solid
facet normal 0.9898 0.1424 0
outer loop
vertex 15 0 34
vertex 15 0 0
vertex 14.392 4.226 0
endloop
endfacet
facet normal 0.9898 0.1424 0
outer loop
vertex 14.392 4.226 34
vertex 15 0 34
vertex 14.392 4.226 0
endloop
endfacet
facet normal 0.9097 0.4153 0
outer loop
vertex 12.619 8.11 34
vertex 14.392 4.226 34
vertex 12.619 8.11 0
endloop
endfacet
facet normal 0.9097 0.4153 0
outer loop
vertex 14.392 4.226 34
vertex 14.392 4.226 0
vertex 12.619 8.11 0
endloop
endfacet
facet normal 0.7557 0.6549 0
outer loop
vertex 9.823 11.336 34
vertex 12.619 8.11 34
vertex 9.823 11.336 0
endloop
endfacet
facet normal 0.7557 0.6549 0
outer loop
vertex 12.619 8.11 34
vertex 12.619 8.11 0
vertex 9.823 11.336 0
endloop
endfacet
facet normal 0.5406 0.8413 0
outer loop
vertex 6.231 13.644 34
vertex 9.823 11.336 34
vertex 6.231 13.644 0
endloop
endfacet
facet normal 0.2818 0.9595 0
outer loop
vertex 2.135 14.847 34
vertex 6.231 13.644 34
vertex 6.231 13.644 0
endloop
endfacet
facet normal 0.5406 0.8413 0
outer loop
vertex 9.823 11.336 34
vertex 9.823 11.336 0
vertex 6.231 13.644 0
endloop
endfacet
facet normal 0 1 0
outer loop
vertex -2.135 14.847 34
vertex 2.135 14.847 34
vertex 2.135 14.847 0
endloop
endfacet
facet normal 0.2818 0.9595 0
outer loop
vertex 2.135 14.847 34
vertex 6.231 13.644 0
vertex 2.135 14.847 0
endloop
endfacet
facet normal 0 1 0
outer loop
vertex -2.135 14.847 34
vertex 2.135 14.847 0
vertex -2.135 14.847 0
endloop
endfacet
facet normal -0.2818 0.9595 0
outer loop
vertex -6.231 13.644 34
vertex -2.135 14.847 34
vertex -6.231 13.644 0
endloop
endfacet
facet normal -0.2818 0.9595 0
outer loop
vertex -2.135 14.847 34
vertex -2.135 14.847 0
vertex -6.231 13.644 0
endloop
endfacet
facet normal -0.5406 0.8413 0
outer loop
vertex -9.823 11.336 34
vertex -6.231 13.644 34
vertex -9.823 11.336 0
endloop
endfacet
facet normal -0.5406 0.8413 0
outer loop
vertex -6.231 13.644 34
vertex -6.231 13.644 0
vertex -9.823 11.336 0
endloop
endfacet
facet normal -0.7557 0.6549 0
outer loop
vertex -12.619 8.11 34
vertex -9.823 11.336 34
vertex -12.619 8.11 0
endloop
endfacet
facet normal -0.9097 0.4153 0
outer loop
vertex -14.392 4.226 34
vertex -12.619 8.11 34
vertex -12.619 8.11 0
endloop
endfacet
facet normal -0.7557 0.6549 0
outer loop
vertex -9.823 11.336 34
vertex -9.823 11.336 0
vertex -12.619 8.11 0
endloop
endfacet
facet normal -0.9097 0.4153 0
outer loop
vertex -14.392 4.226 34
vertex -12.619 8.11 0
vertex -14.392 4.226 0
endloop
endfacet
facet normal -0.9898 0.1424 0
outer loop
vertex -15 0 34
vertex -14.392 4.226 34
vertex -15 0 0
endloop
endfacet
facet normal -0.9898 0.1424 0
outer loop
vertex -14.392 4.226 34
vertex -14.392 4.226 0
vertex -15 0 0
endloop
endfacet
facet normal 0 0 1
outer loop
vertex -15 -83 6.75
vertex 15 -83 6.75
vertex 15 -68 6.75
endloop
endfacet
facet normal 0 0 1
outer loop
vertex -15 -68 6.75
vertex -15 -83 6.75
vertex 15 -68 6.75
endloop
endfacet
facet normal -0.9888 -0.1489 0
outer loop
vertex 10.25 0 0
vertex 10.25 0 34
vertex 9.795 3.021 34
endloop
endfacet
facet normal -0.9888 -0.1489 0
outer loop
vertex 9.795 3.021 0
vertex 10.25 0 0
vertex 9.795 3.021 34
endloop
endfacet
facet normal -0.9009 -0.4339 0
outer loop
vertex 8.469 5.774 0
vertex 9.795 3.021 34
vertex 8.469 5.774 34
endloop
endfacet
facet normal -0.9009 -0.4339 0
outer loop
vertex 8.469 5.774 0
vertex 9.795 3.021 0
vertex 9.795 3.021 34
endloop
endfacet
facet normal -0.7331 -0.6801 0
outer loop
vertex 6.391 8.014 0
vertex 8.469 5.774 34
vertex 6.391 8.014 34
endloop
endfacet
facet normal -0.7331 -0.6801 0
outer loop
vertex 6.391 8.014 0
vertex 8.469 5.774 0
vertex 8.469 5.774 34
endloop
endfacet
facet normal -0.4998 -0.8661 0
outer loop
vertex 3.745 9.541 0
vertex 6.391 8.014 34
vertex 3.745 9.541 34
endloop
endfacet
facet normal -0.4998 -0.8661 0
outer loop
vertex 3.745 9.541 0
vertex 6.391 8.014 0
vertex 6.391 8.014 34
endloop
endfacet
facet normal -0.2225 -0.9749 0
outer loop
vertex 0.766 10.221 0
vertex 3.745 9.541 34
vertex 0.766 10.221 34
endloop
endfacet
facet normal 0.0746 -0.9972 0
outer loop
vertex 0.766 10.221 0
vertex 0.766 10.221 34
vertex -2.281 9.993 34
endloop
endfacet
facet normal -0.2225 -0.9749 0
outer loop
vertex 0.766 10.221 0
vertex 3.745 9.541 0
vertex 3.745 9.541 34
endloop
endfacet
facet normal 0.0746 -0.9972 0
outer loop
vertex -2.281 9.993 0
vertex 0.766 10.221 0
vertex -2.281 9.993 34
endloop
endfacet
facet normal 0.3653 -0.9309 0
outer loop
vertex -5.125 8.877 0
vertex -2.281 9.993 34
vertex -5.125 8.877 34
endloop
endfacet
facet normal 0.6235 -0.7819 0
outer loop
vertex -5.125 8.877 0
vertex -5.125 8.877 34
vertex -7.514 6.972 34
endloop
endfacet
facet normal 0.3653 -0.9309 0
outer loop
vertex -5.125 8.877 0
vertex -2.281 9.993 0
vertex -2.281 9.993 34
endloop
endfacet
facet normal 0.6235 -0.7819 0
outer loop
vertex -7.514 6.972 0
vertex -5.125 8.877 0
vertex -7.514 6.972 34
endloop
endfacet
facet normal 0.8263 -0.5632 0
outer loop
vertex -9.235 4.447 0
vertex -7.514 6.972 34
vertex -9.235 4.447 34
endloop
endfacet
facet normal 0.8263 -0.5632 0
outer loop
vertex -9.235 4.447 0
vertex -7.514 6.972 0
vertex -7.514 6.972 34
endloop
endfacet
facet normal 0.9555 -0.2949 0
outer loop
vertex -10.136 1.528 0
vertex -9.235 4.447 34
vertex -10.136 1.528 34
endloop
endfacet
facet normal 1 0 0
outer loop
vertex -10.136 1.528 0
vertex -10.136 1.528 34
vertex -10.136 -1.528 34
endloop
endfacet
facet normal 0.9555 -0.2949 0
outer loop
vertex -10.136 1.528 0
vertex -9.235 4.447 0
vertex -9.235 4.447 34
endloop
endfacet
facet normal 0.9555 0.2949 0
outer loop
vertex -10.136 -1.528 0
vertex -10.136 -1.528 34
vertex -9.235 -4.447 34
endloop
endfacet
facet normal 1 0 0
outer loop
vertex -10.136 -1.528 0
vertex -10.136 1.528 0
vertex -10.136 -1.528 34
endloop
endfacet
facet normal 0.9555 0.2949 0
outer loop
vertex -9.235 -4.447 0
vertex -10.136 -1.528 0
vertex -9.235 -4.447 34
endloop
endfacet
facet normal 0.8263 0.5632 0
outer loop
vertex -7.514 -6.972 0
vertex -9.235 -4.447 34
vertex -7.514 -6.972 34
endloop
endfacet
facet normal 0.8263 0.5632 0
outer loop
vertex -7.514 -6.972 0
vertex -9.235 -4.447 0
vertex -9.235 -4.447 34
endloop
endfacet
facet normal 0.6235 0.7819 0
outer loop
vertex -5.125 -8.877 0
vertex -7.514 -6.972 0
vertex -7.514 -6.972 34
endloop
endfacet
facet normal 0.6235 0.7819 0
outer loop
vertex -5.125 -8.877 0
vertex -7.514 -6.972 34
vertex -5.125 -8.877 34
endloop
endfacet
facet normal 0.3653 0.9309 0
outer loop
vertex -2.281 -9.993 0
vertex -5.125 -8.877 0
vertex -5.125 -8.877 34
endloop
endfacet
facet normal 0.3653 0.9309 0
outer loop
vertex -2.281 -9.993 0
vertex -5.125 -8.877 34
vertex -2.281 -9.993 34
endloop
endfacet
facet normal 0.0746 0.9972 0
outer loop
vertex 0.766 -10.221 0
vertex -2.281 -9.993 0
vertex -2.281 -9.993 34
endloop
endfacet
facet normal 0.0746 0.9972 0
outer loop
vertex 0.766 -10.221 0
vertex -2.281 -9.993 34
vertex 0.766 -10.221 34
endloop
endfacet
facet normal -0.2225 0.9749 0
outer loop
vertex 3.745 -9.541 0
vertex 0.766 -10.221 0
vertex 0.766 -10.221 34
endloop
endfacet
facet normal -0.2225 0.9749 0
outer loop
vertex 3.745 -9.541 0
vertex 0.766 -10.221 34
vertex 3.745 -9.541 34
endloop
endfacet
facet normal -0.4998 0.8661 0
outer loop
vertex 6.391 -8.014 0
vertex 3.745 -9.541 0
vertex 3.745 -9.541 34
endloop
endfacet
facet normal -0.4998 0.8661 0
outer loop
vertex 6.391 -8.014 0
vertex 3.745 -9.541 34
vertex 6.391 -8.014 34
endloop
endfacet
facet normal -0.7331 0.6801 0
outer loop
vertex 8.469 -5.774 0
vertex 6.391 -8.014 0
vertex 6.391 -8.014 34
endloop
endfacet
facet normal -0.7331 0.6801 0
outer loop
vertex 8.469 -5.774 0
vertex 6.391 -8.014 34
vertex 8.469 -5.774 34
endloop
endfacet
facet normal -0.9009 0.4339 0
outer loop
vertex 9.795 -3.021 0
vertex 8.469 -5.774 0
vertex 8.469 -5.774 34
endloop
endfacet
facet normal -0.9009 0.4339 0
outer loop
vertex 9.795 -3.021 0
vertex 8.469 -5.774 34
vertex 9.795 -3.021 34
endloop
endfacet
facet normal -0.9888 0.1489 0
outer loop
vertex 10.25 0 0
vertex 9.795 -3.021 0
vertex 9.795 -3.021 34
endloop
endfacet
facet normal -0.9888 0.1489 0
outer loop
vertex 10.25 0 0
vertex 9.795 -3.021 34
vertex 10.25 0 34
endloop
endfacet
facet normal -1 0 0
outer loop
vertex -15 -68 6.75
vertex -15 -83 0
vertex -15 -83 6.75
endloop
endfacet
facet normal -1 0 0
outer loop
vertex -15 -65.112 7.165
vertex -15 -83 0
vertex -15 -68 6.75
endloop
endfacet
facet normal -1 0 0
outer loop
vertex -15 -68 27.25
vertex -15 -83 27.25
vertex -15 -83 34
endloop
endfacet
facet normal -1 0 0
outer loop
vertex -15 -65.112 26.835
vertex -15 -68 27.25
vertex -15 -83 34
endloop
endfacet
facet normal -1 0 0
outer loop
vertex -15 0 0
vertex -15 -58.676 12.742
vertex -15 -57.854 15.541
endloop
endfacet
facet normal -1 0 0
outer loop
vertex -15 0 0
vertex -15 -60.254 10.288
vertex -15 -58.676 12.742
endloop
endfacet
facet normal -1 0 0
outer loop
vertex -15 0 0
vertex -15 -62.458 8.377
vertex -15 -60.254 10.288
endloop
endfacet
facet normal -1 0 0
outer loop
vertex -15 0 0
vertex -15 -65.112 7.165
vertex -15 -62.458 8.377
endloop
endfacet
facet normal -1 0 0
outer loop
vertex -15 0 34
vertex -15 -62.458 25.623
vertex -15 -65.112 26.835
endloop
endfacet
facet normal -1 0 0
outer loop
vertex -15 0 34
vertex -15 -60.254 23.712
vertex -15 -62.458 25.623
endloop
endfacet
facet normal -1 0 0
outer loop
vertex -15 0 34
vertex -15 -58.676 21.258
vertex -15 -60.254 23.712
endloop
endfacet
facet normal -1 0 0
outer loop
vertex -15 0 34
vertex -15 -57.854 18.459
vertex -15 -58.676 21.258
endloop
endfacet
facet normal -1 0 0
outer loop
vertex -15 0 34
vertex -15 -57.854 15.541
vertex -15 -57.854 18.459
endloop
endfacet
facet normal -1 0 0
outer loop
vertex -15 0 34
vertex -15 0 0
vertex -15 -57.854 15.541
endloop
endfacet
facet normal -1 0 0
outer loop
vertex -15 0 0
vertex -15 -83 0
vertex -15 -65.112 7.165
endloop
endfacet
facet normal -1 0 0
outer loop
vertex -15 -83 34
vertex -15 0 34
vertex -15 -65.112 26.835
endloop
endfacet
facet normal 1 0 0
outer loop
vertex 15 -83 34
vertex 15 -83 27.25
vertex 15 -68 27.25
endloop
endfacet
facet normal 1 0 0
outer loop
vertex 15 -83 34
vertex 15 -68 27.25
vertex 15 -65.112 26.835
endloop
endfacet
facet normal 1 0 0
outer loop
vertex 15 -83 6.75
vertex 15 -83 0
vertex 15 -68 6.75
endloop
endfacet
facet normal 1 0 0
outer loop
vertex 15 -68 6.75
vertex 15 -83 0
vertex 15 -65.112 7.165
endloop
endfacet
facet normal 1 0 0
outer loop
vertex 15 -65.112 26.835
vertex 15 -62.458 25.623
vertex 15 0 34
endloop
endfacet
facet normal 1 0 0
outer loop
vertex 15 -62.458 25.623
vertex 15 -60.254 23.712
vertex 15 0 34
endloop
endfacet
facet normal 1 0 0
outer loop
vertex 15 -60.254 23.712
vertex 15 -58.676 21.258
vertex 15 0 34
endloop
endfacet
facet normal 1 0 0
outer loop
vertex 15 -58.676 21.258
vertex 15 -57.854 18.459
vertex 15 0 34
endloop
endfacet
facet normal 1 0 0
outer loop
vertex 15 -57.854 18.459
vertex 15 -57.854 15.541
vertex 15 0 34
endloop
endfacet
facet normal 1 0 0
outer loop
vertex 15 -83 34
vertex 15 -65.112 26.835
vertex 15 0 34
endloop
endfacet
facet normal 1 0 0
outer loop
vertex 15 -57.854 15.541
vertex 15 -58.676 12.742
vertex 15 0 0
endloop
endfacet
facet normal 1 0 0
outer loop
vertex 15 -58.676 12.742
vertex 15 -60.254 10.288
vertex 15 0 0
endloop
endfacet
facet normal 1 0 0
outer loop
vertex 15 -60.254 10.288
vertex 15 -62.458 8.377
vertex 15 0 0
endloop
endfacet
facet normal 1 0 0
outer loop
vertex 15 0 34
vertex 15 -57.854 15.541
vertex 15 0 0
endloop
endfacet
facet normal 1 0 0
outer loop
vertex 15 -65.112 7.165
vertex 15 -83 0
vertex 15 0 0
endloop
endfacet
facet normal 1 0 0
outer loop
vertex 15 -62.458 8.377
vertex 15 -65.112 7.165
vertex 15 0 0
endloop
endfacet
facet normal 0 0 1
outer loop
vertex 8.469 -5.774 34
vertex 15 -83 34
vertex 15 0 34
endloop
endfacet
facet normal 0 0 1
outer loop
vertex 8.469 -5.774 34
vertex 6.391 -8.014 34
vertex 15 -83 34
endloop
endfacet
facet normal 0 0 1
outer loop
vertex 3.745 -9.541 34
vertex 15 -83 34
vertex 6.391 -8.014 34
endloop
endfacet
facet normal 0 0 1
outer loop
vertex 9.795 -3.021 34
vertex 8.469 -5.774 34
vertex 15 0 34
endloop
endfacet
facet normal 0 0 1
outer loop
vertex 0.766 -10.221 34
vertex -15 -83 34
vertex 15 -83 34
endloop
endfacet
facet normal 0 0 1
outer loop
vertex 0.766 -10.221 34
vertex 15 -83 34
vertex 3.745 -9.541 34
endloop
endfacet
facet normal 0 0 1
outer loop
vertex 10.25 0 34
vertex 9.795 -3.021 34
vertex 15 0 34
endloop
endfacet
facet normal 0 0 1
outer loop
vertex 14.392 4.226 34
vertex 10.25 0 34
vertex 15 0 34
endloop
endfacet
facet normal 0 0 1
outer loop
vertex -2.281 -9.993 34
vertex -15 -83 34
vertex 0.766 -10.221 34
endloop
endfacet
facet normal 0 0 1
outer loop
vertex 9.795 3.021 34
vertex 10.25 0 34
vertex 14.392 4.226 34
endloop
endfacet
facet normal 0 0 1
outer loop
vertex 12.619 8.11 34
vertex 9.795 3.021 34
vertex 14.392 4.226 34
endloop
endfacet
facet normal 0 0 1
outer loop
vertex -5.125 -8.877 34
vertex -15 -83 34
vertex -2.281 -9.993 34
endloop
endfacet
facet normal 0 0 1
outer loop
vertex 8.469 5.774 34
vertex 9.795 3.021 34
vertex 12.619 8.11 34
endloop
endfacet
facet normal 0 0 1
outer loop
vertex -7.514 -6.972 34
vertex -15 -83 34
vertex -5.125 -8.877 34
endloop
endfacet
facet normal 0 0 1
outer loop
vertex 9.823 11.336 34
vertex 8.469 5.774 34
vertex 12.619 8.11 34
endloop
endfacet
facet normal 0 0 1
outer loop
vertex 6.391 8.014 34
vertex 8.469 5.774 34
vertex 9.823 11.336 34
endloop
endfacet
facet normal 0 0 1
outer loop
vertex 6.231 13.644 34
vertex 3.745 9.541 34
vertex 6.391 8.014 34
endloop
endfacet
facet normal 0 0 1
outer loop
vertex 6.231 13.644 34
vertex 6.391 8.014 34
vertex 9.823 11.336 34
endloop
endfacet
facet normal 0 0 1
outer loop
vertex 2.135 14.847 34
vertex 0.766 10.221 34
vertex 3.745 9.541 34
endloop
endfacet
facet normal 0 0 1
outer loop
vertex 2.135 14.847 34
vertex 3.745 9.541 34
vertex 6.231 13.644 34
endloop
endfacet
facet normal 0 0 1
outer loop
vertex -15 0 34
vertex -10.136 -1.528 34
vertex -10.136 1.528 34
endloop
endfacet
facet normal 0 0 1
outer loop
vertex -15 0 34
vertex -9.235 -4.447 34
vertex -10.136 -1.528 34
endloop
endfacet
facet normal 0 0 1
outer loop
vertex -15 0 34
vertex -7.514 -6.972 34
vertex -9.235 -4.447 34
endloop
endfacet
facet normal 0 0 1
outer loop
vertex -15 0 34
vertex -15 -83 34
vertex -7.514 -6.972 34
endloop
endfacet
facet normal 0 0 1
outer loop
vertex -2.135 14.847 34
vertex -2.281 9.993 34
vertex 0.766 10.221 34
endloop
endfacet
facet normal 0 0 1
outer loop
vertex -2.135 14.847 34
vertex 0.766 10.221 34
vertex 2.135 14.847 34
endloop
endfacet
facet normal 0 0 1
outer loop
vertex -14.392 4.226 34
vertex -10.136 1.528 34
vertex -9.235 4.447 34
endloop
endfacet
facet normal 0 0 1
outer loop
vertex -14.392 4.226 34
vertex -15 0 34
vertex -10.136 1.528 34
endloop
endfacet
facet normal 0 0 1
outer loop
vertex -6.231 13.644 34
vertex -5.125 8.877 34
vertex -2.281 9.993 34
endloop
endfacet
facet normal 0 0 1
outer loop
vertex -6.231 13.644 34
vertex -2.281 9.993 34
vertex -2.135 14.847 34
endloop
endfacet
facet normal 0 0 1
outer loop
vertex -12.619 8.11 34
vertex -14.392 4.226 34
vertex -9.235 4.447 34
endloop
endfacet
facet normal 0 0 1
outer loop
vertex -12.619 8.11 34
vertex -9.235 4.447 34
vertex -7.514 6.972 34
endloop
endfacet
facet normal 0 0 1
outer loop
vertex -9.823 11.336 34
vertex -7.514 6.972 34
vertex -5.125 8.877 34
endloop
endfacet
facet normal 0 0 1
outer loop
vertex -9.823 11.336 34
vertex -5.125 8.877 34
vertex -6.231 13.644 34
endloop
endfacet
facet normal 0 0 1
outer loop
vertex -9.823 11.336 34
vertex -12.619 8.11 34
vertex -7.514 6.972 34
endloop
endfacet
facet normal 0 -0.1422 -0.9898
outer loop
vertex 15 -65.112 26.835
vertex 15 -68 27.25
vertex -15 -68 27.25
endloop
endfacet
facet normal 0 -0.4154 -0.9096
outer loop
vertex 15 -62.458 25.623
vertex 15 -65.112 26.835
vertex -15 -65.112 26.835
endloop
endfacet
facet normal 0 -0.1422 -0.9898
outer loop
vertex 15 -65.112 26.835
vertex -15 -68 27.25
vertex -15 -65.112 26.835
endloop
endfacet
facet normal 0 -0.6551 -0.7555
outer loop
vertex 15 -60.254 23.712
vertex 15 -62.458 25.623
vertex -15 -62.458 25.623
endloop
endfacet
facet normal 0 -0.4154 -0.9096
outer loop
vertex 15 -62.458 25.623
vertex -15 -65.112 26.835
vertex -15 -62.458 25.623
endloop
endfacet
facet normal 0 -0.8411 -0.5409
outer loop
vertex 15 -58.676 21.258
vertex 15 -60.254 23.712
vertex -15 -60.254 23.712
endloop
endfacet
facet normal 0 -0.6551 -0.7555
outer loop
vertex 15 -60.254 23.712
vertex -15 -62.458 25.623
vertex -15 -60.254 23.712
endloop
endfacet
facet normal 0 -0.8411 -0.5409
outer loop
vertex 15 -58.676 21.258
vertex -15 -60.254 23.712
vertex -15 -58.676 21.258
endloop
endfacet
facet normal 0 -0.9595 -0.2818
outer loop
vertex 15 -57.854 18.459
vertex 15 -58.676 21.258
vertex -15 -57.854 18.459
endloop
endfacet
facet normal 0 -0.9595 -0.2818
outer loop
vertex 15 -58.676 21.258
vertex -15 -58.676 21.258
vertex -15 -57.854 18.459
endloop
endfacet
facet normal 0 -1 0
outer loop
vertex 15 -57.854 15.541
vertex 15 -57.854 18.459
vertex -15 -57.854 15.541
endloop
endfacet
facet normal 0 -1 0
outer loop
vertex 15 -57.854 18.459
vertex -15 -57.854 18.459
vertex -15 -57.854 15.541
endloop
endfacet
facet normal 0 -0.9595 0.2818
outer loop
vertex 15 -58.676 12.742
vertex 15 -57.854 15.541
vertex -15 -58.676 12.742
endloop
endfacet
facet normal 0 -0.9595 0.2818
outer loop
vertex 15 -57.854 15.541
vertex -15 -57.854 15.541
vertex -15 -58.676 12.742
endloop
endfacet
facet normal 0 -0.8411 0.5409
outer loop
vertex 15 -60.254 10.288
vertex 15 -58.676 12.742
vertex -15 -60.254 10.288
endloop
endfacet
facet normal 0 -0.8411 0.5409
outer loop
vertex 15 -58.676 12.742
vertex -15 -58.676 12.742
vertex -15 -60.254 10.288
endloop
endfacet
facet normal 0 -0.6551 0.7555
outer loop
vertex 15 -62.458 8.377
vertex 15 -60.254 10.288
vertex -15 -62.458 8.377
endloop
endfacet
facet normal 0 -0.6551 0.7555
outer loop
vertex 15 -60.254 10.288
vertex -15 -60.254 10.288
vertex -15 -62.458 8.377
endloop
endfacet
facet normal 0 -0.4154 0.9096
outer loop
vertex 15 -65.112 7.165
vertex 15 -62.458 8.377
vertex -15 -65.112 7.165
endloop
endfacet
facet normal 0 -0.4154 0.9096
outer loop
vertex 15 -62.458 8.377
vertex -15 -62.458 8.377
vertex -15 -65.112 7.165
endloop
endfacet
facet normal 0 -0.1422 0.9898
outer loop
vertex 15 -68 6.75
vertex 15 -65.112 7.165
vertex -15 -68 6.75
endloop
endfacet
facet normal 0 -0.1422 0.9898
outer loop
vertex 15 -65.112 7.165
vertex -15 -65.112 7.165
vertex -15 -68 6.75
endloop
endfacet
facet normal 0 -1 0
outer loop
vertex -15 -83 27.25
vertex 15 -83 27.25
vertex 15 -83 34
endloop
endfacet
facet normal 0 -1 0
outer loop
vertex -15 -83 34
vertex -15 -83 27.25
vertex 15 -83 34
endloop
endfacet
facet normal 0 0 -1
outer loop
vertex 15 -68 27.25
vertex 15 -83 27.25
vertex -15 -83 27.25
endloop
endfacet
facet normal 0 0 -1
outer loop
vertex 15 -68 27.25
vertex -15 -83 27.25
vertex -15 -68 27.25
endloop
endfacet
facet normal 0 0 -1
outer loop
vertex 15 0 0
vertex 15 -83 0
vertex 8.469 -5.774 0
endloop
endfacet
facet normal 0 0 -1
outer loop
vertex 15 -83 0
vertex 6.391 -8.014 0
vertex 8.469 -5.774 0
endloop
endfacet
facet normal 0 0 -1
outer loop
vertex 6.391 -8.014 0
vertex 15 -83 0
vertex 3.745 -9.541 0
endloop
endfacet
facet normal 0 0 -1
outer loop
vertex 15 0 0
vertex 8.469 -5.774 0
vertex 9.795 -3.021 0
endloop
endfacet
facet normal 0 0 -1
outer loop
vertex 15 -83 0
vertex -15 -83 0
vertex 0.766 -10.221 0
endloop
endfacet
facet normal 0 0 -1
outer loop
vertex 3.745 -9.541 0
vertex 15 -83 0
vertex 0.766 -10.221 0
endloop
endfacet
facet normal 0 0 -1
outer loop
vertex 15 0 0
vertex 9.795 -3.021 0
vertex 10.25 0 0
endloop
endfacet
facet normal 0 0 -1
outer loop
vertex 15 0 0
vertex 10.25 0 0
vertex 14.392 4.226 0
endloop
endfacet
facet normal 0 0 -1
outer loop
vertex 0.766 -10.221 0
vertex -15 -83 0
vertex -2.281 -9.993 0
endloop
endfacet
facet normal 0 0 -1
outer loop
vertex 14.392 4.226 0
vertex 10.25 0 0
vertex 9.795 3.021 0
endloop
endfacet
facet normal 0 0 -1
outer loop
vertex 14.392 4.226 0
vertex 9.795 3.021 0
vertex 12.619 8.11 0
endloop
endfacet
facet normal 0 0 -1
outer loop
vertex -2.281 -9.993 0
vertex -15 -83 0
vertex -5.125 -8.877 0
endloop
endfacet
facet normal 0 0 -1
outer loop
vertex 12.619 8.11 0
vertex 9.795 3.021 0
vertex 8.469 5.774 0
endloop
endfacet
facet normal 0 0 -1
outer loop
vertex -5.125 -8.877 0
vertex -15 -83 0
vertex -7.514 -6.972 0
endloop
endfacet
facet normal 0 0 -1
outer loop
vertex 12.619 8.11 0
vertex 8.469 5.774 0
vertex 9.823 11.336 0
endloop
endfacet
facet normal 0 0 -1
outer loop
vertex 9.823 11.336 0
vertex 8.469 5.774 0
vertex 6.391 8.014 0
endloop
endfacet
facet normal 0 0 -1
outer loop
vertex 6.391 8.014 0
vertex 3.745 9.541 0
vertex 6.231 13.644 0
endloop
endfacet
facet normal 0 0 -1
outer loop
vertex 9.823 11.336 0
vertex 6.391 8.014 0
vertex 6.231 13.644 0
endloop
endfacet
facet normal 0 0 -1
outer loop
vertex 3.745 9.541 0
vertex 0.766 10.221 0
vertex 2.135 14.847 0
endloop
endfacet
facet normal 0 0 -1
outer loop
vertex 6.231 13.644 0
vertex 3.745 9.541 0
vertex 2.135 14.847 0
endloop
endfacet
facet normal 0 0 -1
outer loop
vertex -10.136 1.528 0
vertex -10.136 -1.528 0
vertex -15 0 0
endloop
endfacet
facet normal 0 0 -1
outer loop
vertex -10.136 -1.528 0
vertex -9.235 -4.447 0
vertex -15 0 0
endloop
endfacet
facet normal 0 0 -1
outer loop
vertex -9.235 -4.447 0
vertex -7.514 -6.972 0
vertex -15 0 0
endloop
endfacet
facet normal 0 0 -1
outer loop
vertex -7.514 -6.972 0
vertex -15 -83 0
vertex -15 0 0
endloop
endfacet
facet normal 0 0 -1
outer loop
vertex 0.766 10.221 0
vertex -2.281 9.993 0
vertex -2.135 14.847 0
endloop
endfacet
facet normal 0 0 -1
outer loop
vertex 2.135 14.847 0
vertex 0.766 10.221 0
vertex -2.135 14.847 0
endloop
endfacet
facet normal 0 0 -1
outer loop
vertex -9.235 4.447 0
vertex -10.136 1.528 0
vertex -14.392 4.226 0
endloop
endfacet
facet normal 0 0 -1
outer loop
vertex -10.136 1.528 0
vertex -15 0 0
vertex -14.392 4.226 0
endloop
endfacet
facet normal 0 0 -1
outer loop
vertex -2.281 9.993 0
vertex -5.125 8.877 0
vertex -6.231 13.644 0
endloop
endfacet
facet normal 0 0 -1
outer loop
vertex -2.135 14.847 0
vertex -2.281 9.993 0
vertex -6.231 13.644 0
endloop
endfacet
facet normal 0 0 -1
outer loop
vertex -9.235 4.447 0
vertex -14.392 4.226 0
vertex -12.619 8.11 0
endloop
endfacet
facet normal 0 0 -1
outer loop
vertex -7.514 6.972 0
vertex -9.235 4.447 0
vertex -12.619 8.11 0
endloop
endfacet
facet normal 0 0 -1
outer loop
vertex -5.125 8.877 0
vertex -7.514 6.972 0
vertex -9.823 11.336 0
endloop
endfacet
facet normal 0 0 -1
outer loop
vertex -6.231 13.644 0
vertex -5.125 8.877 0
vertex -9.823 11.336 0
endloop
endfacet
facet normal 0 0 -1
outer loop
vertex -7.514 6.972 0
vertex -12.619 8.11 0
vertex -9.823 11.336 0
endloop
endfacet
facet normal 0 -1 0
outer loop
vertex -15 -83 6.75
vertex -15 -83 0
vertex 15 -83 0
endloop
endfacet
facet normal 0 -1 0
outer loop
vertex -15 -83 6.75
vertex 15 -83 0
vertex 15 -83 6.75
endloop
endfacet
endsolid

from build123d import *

# Parameters (mm, degrees)
BOSS_EXTRUDE1_DEPTH = 34
SKETCH2_W           = 34
SKETCH2_H           = 15
BOSS_EXTRUDE2_DEPTH = 30
SKETCH3_R           = 10.25
CUT_EXTRUDE1_DEPTH  = 30
SKETCH4_W           = 20.5
SKETCH4_H           = 15
CUT_EXTRUDE2_DEPTH  = 34


with BuildPart() as part:
    # Sketch1 → Boss-Extrude1 (new body)
    # profile 1 of 3: a face of its own
    with BuildSketch(Plane.XY):
        with BuildLine():
            Line((-15, 0), (-15, -68))
            ThreePointArc((-15, -68), (0, -83), (15, -68))
            Line((15, -68), (15, 0))
            ThreePointArc((15, 0), (0, 15), (-15, 0))
        make_face()
        with BuildLine():
            ThreePointArc((-10.25, -68), (0, -78.25), (10.25, -68))
            Line((10.25, -68), (10.25, 0))
            ThreePointArc((10.25, 0), (0, 10.25), (-10.25, 0))
            Line((-10.25, 0), (-10.25, -68))
        make_face(mode=Mode.SUBTRACT)
    # profile 2 of 3: a face of its own
    with BuildSketch(Plane.XY):
        with BuildLine():
            Line((10.25, -68), (10.25, 0))
            ThreePointArc((10.25, 0), (0, -10.25), (-10.25, 0))
            Line((-10.25, 0), (-10.25, -68))
            ThreePointArc((-10.25, -68), (0, -57.75), (10.25, -68))
        make_face()
    # profile 3 of 3: a face of its own
    with BuildSketch(Plane.XY):
        with BuildLine():
            ThreePointArc((-10.25, -68), (0, -78.25), (10.25, -68))
            ThreePointArc((10.25, -68), (0, -57.75), (-10.25, -68))
        make_face()
    extrude(amount=BOSS_EXTRUDE1_DEPTH)

    # Sketch2 → Boss-Extrude2 (add)
    with BuildSketch(Plane.ZY.offset(15)):
        with Locations((17, -75.5)):
            Rectangle(SKETCH2_W, SKETCH2_H)
    extrude(amount=-BOSS_EXTRUDE2_DEPTH)

    # Sketch3 → Cut-Extrude1 (cut)
    with BuildSketch(Plane.ZY.offset(15)):
        with Locations(Location((17, -68, 0), (0, 0, 270))):
            Circle(SKETCH3_R)
    extrude(amount=-CUT_EXTRUDE1_DEPTH, mode=Mode.SUBTRACT)

    # Sketch4 → Cut-Extrude2 (cut)
    with BuildSketch(Plane.ZY.offset(15)):
        with Locations((17, -75.5)):
            Rectangle(SKETCH4_W, SKETCH4_H)
    extrude(amount=-CUT_EXTRUDE2_DEPTH, mode=Mode.SUBTRACT)


solid = part.part
